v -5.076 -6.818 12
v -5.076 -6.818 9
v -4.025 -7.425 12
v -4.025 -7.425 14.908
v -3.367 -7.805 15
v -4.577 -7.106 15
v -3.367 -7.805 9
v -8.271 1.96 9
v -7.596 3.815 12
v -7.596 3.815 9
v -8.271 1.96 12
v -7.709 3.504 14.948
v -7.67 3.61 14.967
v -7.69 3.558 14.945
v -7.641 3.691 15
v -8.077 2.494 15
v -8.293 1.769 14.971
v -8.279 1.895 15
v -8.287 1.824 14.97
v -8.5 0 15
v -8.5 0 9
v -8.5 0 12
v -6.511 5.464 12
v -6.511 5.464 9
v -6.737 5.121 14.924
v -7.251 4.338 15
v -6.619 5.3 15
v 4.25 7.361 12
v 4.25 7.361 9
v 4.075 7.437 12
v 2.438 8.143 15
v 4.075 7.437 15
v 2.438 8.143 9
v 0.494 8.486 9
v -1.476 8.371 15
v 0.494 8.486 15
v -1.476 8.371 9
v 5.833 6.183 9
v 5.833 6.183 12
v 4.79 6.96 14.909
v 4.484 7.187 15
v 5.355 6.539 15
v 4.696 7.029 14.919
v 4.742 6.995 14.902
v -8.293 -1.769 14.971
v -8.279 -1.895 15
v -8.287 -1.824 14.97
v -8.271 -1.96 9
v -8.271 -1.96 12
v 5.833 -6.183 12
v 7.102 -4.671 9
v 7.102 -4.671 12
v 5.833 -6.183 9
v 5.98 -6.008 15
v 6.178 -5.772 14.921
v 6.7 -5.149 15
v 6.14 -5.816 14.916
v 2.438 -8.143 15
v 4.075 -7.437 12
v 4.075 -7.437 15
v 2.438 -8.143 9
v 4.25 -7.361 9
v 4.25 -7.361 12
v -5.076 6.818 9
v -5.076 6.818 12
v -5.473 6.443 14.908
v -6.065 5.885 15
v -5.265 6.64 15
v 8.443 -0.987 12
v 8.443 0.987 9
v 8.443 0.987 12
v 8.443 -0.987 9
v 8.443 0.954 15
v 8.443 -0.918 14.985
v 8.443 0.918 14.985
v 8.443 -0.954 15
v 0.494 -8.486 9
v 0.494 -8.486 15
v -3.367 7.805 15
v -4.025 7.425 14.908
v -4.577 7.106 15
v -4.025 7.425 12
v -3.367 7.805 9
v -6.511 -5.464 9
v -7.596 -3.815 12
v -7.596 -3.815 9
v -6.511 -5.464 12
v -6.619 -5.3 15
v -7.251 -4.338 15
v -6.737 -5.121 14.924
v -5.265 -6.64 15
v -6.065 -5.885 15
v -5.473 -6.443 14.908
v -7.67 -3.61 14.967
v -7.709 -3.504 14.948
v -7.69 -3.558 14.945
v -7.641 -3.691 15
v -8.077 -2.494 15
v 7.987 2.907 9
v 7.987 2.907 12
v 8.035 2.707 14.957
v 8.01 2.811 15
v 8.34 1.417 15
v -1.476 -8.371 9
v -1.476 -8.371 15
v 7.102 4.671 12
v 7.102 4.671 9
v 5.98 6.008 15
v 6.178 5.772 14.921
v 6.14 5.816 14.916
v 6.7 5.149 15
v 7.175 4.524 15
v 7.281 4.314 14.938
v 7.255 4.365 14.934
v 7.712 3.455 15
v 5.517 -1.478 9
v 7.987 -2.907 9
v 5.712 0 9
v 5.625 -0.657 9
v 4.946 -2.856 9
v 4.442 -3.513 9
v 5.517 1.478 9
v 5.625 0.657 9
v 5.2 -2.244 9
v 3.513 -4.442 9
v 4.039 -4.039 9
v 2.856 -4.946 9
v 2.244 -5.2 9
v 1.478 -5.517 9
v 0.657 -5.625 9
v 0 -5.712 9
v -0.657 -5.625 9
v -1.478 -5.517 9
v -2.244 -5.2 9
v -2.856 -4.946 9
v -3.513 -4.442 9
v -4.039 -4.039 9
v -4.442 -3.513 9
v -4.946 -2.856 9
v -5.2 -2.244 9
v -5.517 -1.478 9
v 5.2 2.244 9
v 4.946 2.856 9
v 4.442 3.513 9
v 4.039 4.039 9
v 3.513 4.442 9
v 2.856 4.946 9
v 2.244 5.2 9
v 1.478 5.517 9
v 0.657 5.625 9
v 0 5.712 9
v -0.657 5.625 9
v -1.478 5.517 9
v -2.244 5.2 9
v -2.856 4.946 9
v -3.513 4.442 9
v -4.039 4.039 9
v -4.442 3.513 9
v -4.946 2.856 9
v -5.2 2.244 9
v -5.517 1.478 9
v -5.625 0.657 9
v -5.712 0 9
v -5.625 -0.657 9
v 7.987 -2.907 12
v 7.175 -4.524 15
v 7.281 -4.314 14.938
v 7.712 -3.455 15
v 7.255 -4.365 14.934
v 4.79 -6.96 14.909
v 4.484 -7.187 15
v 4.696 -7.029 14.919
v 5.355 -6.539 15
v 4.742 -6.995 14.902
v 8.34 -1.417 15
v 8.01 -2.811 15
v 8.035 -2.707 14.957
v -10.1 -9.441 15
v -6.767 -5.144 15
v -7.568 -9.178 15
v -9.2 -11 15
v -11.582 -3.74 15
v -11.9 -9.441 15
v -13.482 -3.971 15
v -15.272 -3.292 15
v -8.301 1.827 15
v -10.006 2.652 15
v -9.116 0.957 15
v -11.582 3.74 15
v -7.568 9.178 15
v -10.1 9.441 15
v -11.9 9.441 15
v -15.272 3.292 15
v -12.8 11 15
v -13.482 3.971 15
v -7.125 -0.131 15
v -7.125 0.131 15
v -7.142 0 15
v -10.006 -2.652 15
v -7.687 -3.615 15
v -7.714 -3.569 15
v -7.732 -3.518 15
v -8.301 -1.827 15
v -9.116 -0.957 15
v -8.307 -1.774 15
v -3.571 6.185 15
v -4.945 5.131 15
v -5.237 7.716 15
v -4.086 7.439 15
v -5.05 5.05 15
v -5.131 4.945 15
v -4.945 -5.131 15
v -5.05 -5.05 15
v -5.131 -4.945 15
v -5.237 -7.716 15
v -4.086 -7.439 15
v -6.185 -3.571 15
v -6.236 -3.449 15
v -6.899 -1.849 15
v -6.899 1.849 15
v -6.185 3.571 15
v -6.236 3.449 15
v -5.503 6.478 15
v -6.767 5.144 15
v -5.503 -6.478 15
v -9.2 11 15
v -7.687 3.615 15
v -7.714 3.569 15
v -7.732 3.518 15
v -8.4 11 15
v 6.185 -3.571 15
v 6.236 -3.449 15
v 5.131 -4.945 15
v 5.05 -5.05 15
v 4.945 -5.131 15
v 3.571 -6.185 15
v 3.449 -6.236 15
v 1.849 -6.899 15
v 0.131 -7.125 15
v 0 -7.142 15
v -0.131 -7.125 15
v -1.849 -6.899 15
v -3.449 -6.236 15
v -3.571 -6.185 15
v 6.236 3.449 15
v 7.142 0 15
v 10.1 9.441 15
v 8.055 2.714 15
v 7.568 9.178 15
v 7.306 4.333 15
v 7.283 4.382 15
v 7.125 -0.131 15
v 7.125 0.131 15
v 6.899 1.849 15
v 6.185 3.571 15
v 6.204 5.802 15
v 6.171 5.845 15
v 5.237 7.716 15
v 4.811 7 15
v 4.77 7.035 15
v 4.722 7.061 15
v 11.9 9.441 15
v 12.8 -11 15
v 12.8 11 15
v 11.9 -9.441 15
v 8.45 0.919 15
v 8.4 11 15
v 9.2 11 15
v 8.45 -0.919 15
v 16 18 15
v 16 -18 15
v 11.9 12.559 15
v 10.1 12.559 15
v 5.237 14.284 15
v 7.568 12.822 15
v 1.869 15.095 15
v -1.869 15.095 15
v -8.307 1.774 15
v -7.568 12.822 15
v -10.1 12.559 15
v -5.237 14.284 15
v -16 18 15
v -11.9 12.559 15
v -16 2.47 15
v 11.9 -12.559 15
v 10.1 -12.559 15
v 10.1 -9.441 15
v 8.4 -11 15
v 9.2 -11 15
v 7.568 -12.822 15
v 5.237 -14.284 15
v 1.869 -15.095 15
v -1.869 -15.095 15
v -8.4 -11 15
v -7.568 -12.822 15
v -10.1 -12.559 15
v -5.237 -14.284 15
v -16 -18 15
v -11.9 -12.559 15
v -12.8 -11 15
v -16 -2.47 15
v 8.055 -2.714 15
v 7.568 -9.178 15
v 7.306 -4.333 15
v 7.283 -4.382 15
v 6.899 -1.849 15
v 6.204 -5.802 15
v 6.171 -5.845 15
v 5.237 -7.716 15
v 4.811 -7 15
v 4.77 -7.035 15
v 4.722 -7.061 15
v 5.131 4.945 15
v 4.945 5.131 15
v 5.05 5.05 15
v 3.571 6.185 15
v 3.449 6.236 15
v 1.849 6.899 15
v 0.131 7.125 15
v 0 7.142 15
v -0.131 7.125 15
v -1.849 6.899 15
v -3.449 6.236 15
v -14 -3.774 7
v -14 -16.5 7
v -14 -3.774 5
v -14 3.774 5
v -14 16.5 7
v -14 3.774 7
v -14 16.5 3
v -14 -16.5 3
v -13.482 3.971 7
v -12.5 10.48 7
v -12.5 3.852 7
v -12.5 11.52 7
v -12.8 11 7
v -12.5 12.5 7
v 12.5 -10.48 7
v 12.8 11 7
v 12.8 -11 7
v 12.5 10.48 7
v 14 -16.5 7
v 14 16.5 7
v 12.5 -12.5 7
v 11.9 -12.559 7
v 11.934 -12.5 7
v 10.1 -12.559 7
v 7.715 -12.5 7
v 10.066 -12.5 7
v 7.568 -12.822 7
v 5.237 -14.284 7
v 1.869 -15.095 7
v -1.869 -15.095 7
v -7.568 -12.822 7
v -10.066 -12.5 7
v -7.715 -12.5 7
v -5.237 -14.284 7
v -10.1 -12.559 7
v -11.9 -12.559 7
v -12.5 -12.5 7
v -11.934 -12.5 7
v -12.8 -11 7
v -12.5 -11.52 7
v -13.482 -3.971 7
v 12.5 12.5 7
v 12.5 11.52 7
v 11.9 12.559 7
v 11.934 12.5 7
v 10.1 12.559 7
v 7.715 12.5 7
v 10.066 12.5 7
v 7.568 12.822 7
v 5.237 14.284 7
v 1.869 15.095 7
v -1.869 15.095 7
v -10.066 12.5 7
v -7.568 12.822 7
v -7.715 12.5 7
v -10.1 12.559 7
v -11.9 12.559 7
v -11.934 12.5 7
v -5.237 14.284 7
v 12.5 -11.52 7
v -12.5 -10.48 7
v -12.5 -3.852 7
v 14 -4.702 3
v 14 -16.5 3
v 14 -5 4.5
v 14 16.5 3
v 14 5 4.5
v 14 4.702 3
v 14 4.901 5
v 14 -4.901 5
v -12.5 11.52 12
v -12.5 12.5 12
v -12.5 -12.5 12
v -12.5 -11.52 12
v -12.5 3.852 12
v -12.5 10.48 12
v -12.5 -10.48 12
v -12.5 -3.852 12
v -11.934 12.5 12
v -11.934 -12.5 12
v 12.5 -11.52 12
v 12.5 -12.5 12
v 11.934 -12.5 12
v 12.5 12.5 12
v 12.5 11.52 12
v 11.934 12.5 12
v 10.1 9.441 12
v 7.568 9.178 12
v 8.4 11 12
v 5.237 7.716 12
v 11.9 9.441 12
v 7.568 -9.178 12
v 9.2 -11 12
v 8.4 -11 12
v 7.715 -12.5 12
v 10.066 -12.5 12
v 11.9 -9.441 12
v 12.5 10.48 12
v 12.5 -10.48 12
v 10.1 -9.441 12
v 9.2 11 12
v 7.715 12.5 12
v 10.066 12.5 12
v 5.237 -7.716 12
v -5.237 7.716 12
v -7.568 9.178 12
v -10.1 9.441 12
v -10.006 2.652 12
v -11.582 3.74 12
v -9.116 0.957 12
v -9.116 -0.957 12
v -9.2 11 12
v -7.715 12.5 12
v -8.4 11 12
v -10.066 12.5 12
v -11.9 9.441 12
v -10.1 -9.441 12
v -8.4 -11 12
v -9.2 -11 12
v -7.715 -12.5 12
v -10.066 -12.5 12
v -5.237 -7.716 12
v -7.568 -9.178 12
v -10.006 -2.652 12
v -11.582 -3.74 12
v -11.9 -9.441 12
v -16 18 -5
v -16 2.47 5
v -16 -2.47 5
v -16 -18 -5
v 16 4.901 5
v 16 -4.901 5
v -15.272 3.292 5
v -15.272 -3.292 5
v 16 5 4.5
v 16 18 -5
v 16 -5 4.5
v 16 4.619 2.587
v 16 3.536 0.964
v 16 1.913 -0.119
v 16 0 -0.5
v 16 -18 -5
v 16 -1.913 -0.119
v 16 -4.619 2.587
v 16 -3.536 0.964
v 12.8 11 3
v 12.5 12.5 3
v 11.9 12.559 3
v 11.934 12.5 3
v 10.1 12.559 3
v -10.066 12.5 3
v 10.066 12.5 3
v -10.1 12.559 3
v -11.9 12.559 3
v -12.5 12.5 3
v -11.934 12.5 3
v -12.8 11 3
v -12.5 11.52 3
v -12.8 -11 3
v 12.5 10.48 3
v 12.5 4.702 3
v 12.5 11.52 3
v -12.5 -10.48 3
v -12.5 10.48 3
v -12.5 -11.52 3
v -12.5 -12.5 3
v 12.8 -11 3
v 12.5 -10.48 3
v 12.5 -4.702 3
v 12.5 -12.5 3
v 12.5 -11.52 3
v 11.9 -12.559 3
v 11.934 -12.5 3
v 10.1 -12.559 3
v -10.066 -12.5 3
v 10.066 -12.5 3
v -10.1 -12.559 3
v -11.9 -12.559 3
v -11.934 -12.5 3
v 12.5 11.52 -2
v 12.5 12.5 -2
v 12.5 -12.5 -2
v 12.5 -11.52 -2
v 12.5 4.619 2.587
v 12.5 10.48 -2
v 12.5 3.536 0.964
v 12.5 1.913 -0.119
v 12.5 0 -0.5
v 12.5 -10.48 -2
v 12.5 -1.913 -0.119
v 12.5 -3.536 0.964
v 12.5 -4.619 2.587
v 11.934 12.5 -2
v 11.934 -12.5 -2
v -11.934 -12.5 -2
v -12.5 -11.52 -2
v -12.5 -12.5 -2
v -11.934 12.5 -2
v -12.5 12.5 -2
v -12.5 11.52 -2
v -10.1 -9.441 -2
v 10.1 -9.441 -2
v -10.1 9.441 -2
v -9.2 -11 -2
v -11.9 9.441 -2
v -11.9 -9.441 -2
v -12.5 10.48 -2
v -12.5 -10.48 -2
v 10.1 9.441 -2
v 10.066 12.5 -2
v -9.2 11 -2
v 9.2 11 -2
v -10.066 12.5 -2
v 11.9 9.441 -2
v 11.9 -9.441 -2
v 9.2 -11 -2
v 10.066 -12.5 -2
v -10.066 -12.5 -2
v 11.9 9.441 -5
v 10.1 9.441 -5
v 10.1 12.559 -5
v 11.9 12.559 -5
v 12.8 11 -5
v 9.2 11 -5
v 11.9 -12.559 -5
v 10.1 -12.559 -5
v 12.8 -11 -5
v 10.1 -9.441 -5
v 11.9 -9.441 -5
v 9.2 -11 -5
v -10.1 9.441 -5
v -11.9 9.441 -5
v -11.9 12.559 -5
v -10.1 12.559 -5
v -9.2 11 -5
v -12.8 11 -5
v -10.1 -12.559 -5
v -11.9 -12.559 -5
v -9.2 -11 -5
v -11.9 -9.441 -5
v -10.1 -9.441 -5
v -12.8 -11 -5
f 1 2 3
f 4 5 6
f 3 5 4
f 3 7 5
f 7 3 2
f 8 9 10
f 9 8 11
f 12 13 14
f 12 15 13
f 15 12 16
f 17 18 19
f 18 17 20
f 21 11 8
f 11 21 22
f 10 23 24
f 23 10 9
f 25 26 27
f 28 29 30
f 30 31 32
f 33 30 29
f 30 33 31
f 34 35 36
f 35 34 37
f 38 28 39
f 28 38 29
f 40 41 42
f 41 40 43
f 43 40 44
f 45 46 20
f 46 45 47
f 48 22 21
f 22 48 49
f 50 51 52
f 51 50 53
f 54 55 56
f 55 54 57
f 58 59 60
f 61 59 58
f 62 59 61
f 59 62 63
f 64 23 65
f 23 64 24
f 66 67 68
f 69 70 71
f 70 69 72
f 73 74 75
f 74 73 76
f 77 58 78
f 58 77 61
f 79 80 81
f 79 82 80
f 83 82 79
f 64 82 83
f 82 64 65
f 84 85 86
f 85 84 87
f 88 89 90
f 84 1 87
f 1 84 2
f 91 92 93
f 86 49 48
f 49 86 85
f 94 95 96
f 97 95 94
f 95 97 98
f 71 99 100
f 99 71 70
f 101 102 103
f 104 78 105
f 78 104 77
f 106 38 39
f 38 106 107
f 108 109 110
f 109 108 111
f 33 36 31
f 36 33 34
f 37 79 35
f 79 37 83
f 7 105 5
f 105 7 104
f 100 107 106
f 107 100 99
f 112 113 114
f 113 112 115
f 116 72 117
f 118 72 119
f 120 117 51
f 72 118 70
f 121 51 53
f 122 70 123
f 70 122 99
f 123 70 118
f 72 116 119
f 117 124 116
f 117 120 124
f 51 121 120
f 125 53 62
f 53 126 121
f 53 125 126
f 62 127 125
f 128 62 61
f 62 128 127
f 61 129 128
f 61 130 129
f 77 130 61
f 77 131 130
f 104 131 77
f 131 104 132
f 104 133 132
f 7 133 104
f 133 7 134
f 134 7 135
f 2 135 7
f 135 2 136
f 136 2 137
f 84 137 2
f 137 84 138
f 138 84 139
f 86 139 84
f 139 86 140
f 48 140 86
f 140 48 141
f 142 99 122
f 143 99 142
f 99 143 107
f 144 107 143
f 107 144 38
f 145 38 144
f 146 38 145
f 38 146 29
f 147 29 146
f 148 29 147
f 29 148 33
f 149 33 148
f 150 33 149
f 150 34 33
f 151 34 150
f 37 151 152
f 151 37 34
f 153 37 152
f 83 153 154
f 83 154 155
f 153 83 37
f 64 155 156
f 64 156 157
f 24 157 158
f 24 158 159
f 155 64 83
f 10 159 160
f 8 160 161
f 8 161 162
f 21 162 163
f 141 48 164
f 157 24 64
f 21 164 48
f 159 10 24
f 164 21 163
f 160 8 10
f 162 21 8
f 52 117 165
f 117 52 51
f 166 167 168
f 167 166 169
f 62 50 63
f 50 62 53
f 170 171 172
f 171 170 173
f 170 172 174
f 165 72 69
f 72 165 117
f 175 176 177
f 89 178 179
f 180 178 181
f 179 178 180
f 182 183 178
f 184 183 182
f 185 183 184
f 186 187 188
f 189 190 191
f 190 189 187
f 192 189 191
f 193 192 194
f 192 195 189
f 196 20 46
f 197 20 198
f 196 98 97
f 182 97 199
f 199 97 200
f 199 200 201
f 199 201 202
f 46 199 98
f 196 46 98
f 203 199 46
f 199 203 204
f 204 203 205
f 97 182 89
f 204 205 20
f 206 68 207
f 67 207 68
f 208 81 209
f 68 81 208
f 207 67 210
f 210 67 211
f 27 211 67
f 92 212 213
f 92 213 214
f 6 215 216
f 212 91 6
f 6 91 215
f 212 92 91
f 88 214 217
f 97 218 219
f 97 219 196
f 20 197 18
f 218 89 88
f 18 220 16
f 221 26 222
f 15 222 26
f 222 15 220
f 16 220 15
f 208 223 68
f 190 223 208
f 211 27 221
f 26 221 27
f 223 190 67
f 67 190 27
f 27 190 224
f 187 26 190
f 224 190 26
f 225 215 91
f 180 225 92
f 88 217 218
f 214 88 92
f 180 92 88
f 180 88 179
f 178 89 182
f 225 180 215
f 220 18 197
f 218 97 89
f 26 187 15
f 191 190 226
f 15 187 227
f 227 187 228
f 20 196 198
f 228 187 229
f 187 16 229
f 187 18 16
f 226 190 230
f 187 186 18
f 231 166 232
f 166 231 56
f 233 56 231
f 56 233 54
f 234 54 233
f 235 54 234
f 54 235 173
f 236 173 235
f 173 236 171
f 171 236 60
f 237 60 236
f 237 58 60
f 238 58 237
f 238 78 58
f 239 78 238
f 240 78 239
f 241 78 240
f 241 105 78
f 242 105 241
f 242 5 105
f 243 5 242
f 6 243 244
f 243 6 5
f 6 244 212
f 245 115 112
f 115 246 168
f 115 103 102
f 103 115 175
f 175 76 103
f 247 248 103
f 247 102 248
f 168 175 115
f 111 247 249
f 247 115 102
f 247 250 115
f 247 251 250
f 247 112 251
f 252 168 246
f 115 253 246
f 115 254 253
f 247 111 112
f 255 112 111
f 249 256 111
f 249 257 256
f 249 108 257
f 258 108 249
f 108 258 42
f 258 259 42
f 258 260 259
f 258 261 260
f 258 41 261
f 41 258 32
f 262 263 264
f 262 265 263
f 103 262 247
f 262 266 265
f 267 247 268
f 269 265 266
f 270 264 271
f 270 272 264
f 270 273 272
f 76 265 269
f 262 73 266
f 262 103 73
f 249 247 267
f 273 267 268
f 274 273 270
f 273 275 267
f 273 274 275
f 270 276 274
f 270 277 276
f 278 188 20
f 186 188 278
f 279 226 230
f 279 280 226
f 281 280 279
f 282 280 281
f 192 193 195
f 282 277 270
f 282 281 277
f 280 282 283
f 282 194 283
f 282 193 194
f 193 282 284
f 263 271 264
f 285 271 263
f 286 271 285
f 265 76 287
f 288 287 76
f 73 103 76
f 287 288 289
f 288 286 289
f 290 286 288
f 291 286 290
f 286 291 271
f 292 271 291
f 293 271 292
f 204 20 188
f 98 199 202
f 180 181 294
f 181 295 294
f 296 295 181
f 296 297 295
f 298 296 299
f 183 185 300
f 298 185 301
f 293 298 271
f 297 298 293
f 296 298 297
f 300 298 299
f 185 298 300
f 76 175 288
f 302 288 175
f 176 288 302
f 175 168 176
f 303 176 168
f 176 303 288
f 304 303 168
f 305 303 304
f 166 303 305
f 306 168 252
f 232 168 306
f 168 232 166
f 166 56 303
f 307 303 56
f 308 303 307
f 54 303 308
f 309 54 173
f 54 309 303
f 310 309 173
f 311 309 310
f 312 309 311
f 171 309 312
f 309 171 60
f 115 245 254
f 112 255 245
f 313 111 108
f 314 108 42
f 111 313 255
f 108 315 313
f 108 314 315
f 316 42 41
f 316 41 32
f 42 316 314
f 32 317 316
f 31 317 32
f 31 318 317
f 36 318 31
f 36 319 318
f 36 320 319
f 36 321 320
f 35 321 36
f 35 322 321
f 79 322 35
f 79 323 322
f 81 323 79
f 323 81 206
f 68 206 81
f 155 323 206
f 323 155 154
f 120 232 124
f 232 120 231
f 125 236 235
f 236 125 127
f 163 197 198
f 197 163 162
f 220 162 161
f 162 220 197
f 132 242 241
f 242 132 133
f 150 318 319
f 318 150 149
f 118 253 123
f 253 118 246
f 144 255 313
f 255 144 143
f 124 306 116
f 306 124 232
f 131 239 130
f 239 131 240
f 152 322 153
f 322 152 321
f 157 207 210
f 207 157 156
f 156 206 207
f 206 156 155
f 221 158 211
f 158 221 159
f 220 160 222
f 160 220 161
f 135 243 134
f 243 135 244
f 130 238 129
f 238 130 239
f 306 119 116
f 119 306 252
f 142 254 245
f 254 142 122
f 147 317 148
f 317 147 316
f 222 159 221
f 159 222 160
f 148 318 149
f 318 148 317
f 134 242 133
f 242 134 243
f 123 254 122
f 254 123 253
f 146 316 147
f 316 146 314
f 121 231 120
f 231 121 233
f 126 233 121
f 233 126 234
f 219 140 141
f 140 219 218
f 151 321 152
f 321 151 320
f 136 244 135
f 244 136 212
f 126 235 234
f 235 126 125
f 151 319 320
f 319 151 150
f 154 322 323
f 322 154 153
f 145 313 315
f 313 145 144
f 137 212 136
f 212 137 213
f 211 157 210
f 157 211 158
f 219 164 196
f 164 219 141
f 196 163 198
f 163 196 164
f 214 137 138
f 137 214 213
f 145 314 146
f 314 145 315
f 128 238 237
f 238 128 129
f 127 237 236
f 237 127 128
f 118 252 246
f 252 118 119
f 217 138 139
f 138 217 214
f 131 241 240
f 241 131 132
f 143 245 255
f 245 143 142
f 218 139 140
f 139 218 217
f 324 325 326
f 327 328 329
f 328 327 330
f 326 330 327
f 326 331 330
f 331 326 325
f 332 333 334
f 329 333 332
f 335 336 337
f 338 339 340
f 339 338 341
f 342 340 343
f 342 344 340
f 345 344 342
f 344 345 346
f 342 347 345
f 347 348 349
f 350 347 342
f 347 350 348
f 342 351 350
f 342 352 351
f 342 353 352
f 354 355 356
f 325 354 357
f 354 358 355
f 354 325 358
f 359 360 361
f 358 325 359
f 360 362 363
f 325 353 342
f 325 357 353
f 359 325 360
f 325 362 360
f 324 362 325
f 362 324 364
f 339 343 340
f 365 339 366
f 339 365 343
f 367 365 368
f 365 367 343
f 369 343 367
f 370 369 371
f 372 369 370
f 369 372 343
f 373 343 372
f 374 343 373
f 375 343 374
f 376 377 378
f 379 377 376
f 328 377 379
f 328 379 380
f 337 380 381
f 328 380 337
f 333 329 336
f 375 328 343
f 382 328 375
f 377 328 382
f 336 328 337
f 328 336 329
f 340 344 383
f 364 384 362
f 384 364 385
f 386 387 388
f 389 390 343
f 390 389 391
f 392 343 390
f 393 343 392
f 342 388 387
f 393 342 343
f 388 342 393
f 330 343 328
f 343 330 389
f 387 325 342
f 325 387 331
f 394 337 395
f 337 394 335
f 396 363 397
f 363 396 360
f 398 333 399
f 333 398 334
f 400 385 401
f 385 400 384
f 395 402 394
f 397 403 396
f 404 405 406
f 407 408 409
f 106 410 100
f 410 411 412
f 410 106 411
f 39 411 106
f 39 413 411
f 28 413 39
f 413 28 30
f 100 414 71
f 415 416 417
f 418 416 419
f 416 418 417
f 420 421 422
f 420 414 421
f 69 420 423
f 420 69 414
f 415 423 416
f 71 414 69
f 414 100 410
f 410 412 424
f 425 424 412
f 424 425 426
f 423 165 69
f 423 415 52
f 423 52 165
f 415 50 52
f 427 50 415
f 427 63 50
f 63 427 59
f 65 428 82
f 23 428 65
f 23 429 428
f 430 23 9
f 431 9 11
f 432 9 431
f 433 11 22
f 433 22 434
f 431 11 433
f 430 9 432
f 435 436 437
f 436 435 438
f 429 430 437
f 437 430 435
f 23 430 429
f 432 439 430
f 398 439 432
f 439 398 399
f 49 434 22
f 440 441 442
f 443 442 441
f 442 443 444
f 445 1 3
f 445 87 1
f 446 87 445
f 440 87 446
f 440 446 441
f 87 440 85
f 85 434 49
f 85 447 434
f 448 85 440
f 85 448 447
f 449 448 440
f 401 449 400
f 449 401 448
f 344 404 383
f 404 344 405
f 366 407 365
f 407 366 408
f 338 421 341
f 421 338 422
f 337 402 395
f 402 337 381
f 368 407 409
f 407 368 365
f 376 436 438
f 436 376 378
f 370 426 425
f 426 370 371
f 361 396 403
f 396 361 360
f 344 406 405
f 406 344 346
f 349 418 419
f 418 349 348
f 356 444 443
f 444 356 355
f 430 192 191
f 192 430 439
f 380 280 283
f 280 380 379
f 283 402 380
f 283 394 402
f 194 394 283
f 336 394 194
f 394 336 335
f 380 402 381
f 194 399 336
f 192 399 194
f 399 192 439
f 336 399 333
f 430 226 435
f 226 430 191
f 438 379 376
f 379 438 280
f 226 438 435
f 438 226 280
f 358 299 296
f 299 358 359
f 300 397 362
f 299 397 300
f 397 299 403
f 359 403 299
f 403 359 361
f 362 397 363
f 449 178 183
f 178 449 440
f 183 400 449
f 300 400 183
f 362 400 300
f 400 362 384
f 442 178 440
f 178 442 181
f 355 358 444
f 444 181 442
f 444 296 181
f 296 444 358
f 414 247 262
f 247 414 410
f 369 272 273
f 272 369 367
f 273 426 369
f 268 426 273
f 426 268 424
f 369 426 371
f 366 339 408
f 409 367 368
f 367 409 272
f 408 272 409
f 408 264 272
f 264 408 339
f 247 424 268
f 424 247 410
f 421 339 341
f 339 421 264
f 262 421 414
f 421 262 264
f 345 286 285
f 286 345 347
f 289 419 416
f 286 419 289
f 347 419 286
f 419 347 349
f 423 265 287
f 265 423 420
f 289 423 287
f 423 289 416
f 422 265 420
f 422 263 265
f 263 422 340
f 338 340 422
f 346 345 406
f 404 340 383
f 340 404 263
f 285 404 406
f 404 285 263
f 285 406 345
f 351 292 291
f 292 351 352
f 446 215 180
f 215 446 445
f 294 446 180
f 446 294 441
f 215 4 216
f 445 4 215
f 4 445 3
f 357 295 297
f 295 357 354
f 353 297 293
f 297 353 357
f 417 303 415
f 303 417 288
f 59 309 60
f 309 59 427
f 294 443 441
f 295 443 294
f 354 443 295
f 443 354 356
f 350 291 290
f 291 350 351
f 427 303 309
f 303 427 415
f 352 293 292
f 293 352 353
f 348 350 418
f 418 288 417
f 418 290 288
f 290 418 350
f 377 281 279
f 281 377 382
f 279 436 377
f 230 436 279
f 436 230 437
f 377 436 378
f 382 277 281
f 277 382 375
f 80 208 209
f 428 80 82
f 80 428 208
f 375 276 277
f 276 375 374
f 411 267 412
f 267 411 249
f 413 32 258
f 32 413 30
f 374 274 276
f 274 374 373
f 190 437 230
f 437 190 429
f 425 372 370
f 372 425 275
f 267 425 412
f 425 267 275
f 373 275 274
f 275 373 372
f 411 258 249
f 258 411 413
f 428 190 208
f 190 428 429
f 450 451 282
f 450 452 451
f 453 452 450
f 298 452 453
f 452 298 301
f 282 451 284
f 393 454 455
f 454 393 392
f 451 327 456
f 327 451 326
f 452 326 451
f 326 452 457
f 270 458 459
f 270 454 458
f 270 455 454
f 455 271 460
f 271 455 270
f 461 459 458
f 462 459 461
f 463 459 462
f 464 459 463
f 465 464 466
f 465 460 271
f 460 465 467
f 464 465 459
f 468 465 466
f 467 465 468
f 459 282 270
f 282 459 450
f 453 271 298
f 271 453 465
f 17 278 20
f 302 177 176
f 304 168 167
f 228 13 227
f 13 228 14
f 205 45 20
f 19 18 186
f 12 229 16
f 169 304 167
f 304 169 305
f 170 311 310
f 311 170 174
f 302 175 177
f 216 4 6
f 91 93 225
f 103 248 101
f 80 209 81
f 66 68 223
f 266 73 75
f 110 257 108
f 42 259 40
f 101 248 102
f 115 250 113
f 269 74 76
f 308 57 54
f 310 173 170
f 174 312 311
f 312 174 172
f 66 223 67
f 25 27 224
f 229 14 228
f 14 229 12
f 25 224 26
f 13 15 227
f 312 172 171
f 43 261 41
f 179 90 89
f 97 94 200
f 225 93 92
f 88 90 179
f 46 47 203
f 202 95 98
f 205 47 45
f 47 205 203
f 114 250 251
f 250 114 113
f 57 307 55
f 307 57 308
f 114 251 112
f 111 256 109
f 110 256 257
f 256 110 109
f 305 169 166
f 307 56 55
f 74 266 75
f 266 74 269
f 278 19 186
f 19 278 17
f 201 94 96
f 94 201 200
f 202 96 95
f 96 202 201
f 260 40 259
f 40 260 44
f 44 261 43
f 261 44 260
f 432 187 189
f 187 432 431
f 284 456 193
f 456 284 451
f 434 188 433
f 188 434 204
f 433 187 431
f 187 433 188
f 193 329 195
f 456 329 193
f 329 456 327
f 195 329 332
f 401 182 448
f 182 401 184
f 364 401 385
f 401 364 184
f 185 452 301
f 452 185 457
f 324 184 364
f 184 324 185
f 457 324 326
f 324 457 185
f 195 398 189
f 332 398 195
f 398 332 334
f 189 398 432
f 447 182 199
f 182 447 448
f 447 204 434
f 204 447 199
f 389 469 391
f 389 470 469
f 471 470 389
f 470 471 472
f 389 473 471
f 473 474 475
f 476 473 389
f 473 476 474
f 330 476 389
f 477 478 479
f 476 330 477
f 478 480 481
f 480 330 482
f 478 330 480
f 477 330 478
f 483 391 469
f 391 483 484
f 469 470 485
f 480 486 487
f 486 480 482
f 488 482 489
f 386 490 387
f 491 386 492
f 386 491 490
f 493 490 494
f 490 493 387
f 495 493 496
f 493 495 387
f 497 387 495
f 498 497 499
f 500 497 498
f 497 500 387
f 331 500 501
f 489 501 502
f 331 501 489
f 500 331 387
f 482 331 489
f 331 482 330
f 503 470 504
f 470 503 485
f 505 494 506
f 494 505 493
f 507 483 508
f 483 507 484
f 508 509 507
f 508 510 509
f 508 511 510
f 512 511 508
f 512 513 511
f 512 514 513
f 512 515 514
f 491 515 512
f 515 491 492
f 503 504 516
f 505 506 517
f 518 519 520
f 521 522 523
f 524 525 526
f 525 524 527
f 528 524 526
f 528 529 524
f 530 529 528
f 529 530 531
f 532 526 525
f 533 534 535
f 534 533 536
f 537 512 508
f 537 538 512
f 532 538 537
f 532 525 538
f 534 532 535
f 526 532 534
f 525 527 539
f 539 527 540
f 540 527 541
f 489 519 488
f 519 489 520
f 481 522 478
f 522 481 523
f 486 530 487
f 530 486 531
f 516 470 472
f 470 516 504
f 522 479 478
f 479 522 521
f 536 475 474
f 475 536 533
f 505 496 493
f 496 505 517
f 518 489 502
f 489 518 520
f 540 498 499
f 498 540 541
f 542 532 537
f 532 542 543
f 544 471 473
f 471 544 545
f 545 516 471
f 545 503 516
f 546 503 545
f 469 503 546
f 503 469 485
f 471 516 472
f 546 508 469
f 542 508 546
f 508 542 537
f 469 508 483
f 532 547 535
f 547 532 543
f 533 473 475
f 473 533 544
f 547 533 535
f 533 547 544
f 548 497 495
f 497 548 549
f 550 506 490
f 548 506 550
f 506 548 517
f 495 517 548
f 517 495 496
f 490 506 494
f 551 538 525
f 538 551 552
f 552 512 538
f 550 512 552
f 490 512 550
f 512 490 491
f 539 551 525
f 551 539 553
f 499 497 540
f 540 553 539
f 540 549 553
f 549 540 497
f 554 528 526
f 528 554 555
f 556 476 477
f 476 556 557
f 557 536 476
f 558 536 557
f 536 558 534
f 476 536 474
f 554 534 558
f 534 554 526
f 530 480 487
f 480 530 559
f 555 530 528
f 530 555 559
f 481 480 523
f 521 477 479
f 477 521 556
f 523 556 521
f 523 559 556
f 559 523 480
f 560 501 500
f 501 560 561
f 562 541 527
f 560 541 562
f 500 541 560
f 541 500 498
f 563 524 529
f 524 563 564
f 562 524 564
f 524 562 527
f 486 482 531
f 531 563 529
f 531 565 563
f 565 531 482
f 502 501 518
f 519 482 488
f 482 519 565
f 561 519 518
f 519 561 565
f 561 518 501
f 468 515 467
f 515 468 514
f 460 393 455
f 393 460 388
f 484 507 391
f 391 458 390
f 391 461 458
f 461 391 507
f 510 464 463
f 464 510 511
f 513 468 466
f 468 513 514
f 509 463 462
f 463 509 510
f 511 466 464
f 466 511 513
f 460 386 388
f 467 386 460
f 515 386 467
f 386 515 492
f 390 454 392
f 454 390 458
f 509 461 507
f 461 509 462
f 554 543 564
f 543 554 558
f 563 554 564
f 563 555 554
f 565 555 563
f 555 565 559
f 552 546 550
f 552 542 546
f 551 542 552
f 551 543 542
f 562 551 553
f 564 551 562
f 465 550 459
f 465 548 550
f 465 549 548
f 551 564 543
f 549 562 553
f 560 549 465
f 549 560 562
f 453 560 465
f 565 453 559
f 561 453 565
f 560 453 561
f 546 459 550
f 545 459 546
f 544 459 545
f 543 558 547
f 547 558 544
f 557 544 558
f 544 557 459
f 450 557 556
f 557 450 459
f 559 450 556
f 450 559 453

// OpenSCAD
module tray_neg(){
union(){
    
    translate([0,0,7])cube([28,33,8], center=true);
    translate([0,0,2])cube([25 ,25,8], center=true);
    translate([11,11,0]) cylinder(h=11, r=1.8, center=true);
    translate([11,-11,0]) cylinder(h=11, r=1.8, center=true);
    translate([-11, 11,0]) cylinder(h=11, r=1.8, center=true);
    translate([-11, -11,0]) cylinder(h=11, r=1.8, center=true);
    translate([10,0,4.5])rotate([0,90,0])cylinder(r=5, h=17, center=true);
    }
}
module tray_holder(){
    cube([32,36,10], center =true);  
}

module tray_top(){
    difference(){
    
    union(){
aperture(); 

difference(){
        tray_holder();

union(){  
    translate([0,0,7])cube([28,33,8], center=true);
    translate([0,0,2])cube([25 ,25,8], center=true);
    translate([11,11,0]) cylinder(h=11, r=1.8, center=true);
    translate([11,-11,0]) cylinder(h=11, r=1.8, center=true);
    translate([-11, 11,0]) cylinder(h=11, r=1.8, center=true);
    translate([-11, -11,0]) cylinder(h=11, r=1.8, center=true);
      //cylinder(r=4.3, h=24, center=true);
    translate([0,-11,0])scale([2,1]) cylinder(r=4.2, h=24, center=true);
    translate([0,11,0])scale([2,1]) cylinder(r=4.2, h=24, center=true);
}
   
  translate([0,0,0])  cylinder(r2=3, r1=9, h=12, center=true);
//aperture hole
}
}
  translate([13,0,0 ]) cylinder(r=4, h=20, center=true);
//speaker hole    
}
}

module aperture(){


    difference(){
translate([0,0,-2 ]) cylinder(r=8.5, h=6, center=true);
  translate([0,0,0 ])     cylinder(r2=4.4, r1=7.5, h=13, center=true);
    }
}
module tray_bottom(){
   
difference(){
    
    tray_holder();
    tray_neg();
    }
}
module all(){
rotate([0,180,0]) translate([0,0,-10])tray_top();
 tray_bottom();}

 all();
